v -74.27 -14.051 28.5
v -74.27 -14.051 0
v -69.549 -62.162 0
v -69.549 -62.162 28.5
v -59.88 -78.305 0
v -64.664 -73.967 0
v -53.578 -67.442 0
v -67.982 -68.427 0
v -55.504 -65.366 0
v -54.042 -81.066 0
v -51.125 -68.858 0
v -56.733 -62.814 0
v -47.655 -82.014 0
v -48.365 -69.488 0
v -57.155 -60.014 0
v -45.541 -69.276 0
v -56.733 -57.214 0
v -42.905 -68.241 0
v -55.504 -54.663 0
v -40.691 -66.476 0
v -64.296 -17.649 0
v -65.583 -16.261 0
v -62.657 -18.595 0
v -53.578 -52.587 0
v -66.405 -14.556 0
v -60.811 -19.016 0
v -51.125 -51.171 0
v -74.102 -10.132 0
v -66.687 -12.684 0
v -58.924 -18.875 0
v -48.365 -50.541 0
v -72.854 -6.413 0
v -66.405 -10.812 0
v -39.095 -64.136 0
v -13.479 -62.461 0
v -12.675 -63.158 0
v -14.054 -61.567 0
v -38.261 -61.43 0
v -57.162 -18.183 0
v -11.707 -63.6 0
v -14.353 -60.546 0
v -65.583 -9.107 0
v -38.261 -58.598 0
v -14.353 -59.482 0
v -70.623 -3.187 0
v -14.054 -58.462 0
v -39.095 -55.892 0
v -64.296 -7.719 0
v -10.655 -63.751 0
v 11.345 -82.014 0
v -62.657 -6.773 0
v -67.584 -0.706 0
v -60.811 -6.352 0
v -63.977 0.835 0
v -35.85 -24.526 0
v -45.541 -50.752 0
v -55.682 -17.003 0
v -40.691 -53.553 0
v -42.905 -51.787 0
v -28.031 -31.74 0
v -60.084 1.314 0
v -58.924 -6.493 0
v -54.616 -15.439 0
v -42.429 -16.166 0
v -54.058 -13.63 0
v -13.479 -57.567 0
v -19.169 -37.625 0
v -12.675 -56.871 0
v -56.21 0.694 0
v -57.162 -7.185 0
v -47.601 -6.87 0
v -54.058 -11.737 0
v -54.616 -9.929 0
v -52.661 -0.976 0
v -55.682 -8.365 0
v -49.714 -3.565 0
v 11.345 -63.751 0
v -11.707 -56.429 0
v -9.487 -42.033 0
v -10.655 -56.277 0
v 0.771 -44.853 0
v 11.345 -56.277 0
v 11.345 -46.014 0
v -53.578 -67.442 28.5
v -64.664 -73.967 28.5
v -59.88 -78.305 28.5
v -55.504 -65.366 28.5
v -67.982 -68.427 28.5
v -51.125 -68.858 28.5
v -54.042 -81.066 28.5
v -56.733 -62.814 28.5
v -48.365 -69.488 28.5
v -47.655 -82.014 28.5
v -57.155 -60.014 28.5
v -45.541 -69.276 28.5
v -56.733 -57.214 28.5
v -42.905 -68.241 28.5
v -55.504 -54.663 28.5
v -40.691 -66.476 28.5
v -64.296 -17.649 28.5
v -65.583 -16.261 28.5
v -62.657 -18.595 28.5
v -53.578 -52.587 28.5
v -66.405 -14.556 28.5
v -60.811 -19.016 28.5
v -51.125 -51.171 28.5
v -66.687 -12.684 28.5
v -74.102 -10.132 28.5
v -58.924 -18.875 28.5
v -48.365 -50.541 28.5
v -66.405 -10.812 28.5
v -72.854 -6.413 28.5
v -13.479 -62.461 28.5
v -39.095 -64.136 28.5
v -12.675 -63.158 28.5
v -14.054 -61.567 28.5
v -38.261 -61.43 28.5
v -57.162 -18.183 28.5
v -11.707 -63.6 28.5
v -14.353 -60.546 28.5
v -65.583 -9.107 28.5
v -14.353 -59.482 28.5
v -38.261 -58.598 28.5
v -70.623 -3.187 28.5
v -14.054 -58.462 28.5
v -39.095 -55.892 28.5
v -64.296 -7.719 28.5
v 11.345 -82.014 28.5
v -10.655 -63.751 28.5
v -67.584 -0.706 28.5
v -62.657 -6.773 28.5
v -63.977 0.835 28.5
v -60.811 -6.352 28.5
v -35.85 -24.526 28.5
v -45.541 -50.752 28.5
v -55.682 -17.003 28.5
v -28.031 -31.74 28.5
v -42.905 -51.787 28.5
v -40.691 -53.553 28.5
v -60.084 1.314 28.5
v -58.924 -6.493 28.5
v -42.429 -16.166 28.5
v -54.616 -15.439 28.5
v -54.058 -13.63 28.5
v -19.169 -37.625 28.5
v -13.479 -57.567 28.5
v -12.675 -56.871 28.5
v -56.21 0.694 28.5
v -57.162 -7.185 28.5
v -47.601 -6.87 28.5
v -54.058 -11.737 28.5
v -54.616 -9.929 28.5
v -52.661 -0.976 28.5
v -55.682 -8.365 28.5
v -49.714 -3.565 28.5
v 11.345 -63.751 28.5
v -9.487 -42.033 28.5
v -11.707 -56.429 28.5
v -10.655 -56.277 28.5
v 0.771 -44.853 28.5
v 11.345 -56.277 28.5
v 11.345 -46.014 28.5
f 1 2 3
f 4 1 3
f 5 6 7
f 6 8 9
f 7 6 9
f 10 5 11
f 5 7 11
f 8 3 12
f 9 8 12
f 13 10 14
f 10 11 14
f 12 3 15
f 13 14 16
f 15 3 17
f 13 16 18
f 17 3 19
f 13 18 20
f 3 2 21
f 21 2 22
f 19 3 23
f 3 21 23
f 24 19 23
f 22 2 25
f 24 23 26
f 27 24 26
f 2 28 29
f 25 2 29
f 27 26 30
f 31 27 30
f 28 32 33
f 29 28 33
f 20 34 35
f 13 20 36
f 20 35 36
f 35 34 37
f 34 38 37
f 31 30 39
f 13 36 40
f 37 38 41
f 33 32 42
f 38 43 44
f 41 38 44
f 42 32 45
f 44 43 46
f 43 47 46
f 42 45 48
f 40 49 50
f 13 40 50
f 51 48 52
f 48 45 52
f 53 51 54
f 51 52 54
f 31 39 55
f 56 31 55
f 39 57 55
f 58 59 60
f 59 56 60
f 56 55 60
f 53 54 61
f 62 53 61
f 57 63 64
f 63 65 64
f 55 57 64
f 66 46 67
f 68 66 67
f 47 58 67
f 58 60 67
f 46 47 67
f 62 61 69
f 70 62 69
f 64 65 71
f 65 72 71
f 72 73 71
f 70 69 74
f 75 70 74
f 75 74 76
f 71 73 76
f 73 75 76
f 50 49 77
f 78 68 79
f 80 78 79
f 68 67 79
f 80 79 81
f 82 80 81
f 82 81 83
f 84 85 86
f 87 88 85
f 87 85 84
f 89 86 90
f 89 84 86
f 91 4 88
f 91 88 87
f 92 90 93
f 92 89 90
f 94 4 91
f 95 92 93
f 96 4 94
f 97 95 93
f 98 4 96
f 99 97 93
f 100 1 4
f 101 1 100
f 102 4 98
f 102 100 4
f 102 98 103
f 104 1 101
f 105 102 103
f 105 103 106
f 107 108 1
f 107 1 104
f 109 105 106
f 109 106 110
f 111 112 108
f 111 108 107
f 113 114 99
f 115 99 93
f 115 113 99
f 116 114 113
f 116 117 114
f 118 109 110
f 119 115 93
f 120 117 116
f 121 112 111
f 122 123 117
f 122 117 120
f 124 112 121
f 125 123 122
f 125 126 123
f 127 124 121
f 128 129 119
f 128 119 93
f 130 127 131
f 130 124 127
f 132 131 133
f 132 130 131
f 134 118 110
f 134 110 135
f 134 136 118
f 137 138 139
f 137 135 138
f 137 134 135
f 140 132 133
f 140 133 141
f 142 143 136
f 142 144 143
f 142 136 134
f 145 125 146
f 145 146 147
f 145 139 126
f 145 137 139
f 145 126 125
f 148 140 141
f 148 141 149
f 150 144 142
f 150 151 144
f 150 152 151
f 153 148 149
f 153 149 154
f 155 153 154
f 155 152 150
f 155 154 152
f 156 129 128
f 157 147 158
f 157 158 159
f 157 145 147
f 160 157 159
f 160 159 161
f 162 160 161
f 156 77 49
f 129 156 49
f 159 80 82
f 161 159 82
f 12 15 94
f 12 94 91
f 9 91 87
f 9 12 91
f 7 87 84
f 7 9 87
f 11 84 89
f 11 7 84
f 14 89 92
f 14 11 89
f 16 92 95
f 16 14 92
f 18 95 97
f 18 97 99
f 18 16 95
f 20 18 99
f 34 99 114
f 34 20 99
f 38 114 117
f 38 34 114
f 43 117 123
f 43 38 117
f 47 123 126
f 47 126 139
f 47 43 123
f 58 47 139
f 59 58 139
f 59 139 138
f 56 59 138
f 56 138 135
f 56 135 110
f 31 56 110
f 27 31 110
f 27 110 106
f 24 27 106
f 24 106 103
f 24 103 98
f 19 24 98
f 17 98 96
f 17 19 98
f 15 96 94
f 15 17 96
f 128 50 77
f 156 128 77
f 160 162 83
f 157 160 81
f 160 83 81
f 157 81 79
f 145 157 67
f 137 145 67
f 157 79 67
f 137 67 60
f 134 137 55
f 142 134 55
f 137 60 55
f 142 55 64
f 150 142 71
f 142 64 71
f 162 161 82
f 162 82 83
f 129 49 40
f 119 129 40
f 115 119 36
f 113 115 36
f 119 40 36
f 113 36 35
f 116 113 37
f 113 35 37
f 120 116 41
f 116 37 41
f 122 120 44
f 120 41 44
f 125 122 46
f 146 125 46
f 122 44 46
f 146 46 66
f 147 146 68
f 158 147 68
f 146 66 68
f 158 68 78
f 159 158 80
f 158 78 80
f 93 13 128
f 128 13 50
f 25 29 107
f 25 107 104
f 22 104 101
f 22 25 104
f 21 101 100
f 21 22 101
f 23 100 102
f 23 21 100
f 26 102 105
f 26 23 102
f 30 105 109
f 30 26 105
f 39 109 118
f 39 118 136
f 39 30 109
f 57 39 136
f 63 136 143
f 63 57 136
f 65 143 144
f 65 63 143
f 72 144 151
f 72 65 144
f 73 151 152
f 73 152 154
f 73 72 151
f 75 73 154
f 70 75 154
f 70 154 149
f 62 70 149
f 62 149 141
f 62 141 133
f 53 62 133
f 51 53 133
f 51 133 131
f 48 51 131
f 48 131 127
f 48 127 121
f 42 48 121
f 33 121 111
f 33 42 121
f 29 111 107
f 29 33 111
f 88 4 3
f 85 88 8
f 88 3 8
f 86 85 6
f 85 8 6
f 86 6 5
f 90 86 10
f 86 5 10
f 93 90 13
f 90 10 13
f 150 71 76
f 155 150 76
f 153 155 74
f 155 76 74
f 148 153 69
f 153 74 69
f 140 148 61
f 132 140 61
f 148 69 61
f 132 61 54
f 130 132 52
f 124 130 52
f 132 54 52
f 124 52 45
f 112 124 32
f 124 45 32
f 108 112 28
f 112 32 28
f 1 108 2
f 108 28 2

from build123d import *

# Parameters (mm, degrees)
ESQUISSE1_R        = 6.35
ESQUISSE1_R_2      = 9.5
BOSS_EXTRU_1_DEPTH = 28.5


with BuildPart() as part:
    # Esquisse1 → Boss.-Extru.1 (new body)
    with BuildSketch(Plane.XY):
        with BuildLine():
            Line((-74.269831122, -14.050908363), (-69.549469101, -62.162426551))
            ThreePointArc((-69.549469101, -62.162426551), (-62.431950288, -76.312412018), (-47.654598332, -82.014256626))
            Line((-47.654598332, -82.014256626), (11.345401668, -82.014256626))
            Line((11.345401668, -82.014256626), (11.345401668, -63.751175412))
            Line((11.345401668, -63.751175412), (-10.654598332, -63.751175412))
            ThreePointArc((-10.654598332, -63.751175412), (-14.391517119, -60.014256626), (-10.654598332, -56.27733784))
            Line((-10.654598332, -56.27733784), (11.345401668, -56.27733784))
            Line((11.345401668, -56.27733784), (11.345401668, -46.014256626))
            ThreePointArc((11.345401668, -46.014256626), (-23.716977968, -34.858356839), (-47.601181026, -6.869619639))
            ThreePointArc((-47.601181026, -6.869619639), (-63.976959265, 0.834568173), (-74.269831122, -14.050908363))
        make_face()
        with Locations(Location((-60.336723839, -12.683889074, 0), (0, 0, 180))):
            Circle(ESQUISSE1_R, mode=Mode.SUBTRACT)
        with Locations(Location((-47.654598332, -60.014256626, 0), (0, 0, 180))):
            Circle(ESQUISSE1_R_2, mode=Mode.SUBTRACT)
    extrude(amount=BOSS_EXTRU_1_DEPTH)


solid = part.part
